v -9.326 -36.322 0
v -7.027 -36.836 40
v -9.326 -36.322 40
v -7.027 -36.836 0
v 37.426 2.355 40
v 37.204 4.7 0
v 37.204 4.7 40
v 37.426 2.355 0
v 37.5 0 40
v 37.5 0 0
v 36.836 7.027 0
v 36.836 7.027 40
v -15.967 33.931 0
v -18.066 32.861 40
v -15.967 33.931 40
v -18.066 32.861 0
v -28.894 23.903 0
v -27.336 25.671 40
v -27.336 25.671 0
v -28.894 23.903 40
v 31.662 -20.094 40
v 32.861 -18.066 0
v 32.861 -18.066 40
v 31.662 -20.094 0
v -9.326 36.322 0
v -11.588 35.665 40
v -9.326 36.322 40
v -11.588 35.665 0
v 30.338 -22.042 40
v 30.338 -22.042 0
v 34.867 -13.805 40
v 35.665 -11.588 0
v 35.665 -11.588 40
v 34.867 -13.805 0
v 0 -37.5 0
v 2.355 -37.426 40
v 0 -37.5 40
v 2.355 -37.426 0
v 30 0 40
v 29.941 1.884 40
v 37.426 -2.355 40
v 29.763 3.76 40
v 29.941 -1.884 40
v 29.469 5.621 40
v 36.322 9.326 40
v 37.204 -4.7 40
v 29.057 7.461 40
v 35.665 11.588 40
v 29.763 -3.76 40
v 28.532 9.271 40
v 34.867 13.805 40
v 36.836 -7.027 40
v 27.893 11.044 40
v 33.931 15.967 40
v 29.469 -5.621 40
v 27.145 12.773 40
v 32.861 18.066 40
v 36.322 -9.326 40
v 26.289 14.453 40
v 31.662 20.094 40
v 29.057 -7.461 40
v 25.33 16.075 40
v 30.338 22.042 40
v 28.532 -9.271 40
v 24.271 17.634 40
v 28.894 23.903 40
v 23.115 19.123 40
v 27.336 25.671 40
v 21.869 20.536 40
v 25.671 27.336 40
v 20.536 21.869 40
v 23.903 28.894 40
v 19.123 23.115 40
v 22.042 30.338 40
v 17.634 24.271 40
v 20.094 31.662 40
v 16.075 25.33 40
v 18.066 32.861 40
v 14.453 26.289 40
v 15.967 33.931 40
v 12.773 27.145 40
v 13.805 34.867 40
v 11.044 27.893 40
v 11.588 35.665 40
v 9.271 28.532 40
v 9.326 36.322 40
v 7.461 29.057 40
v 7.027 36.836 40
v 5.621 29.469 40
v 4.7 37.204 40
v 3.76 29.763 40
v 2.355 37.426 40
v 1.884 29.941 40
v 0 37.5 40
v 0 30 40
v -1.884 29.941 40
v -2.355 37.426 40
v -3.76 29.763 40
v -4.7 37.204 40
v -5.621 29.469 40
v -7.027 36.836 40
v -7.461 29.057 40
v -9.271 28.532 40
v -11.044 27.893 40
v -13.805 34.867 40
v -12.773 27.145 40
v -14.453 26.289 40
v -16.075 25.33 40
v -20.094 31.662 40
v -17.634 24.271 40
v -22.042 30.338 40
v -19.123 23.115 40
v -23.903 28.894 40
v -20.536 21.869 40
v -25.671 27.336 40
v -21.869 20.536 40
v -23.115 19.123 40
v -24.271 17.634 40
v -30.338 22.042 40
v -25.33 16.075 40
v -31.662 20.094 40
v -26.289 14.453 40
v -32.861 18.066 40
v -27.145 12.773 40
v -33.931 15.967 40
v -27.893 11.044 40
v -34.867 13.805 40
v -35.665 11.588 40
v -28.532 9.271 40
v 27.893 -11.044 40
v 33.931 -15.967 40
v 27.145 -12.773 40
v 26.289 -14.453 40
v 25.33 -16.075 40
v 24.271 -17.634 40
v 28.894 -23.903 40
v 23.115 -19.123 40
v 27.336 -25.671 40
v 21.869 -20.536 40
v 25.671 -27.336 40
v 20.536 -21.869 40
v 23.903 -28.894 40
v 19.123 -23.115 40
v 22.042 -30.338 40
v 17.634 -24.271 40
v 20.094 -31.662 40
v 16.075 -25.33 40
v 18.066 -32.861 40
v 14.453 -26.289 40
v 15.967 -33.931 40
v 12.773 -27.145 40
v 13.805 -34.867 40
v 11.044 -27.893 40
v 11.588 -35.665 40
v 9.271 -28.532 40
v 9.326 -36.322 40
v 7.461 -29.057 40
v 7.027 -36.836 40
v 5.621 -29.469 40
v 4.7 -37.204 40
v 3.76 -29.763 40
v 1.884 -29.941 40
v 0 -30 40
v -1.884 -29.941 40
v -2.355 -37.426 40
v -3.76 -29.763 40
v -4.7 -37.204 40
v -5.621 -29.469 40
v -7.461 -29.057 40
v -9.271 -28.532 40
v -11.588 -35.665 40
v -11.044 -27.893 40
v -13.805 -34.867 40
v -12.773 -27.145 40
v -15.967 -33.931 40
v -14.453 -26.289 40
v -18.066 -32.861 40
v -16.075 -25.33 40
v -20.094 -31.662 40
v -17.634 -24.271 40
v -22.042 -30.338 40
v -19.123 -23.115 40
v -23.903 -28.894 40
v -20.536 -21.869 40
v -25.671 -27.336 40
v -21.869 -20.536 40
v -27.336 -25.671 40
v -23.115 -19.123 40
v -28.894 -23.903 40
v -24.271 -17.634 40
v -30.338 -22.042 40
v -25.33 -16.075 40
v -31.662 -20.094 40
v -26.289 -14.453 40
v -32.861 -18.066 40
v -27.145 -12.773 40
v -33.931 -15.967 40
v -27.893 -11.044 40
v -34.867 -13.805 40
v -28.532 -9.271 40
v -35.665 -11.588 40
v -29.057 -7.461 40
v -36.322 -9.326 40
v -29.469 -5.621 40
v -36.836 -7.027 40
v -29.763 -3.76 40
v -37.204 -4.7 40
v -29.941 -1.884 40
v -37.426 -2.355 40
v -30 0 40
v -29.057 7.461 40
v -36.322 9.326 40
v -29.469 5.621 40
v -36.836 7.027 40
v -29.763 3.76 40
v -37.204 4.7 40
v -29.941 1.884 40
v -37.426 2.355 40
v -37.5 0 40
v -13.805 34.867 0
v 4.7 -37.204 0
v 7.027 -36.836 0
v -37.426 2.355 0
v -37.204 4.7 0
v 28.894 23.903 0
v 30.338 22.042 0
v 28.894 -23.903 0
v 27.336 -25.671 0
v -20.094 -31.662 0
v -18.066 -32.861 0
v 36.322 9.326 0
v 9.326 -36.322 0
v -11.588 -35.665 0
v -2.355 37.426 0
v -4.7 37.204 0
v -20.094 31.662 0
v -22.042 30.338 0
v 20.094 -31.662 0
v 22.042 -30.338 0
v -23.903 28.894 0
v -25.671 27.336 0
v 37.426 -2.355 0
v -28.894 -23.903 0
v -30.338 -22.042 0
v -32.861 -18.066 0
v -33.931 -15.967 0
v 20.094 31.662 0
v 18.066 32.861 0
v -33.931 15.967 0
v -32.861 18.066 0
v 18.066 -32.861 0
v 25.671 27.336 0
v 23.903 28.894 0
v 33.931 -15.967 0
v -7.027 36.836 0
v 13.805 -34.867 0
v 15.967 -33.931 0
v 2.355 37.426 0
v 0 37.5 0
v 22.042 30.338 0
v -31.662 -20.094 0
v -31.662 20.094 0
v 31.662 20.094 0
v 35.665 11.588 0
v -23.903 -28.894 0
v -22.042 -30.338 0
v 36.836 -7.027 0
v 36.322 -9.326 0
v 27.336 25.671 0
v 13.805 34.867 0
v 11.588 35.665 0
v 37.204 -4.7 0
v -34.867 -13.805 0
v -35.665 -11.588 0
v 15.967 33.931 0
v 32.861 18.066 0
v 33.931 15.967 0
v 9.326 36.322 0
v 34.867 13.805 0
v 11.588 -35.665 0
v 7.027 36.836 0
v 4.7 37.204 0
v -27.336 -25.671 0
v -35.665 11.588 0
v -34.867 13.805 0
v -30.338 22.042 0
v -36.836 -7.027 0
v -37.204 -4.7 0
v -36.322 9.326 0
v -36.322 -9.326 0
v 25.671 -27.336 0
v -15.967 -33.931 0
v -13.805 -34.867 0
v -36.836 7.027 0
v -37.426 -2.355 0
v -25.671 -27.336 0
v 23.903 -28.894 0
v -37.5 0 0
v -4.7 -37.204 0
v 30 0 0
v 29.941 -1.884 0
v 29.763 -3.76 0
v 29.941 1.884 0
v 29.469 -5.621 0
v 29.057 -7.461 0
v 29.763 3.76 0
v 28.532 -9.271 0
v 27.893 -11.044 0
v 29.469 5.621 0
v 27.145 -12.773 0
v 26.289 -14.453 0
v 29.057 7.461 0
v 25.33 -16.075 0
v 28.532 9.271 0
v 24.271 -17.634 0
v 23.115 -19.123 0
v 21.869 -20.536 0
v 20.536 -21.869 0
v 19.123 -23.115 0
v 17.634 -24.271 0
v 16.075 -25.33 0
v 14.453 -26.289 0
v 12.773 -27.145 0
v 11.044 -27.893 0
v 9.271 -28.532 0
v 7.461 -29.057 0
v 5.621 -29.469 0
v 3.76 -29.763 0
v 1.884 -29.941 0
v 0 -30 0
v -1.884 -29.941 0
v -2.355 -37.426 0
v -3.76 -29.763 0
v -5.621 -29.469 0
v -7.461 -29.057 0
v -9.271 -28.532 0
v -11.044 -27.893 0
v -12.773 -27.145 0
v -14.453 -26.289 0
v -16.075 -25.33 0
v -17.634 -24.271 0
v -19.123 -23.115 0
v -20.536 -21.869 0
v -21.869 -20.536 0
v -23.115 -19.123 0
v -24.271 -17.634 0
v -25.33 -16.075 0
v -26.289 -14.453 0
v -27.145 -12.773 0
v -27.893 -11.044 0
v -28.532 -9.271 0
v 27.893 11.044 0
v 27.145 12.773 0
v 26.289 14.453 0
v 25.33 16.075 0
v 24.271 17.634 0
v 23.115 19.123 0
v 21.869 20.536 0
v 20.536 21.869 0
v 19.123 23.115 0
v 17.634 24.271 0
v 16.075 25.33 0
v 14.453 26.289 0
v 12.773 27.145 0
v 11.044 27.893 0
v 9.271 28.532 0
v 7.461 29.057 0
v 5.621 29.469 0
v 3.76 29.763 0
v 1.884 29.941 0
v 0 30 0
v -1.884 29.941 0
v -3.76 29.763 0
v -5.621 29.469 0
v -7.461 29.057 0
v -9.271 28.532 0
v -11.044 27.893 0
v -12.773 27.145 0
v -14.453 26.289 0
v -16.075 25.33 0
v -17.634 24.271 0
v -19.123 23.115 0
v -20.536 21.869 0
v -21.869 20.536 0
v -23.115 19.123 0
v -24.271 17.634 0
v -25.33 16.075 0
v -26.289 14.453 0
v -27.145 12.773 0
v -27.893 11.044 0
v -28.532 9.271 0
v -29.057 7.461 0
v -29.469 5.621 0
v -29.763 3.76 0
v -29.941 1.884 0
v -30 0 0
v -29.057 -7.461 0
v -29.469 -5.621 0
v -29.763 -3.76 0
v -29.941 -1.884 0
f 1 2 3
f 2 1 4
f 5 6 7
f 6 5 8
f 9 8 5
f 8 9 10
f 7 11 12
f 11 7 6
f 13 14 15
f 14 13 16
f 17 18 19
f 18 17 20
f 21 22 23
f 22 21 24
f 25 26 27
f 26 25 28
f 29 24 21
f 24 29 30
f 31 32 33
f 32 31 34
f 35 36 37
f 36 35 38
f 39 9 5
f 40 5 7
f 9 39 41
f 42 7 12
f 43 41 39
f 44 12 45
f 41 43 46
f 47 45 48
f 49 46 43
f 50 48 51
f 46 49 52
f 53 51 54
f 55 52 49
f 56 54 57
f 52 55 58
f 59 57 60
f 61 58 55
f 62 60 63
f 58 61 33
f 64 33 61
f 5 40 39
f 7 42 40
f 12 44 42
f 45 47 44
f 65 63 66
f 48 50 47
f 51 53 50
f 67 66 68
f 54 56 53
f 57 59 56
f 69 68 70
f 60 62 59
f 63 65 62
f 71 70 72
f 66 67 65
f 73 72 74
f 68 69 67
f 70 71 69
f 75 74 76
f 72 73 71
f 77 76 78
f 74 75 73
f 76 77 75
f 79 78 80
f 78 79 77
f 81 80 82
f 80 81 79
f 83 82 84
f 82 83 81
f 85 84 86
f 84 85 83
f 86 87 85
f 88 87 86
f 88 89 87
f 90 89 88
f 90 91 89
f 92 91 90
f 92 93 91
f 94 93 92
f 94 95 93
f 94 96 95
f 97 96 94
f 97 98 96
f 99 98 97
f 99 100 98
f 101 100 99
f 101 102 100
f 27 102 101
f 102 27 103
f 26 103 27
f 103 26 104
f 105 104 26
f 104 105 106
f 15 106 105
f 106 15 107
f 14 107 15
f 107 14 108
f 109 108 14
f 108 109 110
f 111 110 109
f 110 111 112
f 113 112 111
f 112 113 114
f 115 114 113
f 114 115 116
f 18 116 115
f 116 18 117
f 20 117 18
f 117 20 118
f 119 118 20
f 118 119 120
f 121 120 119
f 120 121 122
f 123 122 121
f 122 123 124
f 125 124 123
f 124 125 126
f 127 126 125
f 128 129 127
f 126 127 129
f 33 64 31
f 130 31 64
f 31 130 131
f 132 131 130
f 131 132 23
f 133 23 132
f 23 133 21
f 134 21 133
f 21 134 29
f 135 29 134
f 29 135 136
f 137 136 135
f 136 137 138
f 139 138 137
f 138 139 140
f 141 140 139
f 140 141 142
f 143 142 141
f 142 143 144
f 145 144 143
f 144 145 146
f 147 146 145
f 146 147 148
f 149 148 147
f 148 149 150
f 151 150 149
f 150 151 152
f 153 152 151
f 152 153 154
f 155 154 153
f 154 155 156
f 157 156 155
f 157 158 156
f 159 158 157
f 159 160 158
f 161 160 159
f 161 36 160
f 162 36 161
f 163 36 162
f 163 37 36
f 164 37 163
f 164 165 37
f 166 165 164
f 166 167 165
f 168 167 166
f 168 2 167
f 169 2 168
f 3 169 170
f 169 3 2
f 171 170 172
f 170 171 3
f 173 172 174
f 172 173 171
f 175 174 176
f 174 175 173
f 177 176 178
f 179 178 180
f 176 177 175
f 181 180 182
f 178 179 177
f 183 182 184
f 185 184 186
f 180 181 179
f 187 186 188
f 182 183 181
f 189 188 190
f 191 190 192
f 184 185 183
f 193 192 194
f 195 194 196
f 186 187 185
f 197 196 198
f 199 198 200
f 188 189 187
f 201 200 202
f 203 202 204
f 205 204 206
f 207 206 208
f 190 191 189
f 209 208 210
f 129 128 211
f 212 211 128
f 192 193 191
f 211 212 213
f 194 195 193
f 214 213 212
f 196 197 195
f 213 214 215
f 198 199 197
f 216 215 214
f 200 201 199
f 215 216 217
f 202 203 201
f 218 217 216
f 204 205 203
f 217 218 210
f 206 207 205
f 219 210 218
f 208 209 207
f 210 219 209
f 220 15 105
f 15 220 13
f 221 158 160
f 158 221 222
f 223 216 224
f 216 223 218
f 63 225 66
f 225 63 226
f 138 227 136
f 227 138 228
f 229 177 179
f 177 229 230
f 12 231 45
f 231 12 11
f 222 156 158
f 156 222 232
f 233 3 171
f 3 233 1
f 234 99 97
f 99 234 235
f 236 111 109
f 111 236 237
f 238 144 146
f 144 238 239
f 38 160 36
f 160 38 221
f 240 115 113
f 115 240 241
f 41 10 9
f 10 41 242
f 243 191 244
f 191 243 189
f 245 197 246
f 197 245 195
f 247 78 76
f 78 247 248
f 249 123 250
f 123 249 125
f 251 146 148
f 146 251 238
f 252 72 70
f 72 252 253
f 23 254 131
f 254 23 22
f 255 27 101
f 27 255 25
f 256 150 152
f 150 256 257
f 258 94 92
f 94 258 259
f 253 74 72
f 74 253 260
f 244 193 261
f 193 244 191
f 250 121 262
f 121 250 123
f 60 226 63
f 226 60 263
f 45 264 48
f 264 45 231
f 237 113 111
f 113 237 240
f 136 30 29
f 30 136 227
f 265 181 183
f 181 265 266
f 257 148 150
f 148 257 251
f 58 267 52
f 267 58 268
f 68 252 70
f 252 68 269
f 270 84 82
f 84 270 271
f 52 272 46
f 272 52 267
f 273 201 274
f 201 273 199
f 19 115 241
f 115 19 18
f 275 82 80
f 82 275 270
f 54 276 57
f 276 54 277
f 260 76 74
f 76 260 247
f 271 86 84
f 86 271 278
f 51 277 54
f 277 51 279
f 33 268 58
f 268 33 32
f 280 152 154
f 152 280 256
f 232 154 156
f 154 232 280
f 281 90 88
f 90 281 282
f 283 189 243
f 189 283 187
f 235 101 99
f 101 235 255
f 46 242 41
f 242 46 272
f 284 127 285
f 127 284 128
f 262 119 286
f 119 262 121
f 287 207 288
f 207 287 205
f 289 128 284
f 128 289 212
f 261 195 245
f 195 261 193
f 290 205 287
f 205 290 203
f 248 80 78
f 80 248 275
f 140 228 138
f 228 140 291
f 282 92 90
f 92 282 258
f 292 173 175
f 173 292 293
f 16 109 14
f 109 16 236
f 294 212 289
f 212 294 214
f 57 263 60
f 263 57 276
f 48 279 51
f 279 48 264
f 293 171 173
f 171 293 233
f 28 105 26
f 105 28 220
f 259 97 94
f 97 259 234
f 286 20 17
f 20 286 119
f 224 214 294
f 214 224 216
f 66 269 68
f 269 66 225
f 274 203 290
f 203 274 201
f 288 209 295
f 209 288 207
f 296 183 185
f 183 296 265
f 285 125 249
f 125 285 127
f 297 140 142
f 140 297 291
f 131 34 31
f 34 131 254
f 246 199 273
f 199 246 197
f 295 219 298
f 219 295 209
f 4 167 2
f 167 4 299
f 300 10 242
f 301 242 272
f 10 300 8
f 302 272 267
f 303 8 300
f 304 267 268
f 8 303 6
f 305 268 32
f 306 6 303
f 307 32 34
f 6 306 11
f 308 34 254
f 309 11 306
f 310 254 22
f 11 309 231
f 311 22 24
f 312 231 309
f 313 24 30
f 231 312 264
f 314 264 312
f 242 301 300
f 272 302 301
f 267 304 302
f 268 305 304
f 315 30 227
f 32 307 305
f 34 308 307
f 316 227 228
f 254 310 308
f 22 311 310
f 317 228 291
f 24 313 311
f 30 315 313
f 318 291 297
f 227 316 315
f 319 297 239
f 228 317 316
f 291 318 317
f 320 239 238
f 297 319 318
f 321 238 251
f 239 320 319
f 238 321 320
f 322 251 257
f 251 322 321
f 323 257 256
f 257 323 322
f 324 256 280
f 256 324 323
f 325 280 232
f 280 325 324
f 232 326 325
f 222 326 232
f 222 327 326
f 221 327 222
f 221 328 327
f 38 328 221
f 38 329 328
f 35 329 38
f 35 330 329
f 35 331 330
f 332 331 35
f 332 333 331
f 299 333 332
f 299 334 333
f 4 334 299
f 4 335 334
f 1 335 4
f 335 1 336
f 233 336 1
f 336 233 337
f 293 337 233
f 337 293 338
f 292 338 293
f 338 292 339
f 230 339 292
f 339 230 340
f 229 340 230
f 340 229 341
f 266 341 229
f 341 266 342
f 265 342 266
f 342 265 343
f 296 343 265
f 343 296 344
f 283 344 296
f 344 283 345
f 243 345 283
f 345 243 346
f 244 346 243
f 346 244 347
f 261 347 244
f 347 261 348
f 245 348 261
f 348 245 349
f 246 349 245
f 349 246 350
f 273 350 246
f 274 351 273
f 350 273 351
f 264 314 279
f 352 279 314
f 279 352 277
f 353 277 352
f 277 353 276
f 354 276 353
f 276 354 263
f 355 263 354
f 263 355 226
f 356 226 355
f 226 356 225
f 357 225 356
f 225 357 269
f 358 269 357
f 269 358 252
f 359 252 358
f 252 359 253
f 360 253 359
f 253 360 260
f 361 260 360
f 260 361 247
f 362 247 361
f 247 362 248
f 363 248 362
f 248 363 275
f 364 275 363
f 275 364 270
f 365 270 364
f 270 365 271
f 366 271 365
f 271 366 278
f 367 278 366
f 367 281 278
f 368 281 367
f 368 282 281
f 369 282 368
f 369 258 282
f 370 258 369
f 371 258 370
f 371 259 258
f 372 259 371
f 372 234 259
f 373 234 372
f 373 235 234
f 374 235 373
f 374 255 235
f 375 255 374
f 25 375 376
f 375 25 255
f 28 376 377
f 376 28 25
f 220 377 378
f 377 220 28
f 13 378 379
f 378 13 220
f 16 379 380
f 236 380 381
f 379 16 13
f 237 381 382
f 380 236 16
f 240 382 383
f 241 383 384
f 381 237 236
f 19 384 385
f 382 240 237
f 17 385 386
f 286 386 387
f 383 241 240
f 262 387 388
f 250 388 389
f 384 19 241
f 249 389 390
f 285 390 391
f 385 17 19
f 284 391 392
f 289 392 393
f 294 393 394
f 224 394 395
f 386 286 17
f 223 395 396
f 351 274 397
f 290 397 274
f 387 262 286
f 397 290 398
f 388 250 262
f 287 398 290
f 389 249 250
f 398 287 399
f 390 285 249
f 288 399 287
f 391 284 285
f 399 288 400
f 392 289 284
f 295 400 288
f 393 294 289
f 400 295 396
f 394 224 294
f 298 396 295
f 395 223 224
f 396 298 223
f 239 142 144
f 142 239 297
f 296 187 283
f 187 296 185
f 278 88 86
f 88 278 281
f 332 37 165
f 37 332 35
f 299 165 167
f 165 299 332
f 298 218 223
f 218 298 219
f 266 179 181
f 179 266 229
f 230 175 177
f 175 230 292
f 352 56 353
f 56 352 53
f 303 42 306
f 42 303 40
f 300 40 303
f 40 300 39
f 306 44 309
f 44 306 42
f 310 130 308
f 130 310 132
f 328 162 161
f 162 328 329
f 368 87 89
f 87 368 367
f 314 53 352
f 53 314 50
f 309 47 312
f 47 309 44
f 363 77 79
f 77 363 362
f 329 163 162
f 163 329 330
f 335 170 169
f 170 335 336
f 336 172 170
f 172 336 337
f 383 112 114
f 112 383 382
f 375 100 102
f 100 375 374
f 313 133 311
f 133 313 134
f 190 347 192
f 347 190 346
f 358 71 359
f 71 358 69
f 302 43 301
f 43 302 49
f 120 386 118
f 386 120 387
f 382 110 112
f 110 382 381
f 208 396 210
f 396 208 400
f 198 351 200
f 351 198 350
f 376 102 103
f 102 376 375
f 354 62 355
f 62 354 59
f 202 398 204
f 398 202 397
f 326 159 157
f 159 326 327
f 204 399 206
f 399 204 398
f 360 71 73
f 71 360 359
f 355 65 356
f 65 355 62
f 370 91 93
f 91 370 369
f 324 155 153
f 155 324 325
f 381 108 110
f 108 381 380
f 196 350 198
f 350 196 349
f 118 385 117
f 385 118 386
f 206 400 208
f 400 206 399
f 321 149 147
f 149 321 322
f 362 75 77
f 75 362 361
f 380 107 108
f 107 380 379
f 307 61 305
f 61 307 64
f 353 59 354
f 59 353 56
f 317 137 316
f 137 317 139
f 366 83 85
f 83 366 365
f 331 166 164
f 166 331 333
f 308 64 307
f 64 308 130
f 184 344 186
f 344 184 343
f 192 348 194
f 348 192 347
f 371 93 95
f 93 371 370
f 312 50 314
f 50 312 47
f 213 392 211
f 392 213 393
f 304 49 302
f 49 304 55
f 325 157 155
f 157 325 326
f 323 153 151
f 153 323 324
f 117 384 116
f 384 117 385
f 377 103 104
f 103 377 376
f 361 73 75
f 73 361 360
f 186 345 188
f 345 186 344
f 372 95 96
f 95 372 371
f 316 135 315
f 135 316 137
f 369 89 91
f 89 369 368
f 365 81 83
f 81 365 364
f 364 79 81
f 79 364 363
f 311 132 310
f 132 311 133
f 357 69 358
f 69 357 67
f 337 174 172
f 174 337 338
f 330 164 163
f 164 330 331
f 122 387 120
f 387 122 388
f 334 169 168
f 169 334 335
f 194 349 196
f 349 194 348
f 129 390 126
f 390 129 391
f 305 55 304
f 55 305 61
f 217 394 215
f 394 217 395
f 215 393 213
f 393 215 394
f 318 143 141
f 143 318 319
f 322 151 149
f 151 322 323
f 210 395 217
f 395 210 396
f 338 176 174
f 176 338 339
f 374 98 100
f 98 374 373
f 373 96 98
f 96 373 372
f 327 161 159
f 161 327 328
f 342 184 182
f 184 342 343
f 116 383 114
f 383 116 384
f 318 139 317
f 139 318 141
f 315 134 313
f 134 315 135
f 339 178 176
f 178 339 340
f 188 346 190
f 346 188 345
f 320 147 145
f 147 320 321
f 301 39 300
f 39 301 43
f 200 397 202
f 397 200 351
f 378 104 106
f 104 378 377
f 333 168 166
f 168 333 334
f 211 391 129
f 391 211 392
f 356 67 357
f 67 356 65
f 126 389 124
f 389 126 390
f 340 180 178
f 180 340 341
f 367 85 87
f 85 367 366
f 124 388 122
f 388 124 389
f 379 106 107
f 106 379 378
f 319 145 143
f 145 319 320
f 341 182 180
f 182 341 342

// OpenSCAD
$fn=100;
difference() {
  color("yellow") cylinder(h=40,d=75);
  color("red")    translate([0,0,0]) cylinder(h=40,d=60);
}
